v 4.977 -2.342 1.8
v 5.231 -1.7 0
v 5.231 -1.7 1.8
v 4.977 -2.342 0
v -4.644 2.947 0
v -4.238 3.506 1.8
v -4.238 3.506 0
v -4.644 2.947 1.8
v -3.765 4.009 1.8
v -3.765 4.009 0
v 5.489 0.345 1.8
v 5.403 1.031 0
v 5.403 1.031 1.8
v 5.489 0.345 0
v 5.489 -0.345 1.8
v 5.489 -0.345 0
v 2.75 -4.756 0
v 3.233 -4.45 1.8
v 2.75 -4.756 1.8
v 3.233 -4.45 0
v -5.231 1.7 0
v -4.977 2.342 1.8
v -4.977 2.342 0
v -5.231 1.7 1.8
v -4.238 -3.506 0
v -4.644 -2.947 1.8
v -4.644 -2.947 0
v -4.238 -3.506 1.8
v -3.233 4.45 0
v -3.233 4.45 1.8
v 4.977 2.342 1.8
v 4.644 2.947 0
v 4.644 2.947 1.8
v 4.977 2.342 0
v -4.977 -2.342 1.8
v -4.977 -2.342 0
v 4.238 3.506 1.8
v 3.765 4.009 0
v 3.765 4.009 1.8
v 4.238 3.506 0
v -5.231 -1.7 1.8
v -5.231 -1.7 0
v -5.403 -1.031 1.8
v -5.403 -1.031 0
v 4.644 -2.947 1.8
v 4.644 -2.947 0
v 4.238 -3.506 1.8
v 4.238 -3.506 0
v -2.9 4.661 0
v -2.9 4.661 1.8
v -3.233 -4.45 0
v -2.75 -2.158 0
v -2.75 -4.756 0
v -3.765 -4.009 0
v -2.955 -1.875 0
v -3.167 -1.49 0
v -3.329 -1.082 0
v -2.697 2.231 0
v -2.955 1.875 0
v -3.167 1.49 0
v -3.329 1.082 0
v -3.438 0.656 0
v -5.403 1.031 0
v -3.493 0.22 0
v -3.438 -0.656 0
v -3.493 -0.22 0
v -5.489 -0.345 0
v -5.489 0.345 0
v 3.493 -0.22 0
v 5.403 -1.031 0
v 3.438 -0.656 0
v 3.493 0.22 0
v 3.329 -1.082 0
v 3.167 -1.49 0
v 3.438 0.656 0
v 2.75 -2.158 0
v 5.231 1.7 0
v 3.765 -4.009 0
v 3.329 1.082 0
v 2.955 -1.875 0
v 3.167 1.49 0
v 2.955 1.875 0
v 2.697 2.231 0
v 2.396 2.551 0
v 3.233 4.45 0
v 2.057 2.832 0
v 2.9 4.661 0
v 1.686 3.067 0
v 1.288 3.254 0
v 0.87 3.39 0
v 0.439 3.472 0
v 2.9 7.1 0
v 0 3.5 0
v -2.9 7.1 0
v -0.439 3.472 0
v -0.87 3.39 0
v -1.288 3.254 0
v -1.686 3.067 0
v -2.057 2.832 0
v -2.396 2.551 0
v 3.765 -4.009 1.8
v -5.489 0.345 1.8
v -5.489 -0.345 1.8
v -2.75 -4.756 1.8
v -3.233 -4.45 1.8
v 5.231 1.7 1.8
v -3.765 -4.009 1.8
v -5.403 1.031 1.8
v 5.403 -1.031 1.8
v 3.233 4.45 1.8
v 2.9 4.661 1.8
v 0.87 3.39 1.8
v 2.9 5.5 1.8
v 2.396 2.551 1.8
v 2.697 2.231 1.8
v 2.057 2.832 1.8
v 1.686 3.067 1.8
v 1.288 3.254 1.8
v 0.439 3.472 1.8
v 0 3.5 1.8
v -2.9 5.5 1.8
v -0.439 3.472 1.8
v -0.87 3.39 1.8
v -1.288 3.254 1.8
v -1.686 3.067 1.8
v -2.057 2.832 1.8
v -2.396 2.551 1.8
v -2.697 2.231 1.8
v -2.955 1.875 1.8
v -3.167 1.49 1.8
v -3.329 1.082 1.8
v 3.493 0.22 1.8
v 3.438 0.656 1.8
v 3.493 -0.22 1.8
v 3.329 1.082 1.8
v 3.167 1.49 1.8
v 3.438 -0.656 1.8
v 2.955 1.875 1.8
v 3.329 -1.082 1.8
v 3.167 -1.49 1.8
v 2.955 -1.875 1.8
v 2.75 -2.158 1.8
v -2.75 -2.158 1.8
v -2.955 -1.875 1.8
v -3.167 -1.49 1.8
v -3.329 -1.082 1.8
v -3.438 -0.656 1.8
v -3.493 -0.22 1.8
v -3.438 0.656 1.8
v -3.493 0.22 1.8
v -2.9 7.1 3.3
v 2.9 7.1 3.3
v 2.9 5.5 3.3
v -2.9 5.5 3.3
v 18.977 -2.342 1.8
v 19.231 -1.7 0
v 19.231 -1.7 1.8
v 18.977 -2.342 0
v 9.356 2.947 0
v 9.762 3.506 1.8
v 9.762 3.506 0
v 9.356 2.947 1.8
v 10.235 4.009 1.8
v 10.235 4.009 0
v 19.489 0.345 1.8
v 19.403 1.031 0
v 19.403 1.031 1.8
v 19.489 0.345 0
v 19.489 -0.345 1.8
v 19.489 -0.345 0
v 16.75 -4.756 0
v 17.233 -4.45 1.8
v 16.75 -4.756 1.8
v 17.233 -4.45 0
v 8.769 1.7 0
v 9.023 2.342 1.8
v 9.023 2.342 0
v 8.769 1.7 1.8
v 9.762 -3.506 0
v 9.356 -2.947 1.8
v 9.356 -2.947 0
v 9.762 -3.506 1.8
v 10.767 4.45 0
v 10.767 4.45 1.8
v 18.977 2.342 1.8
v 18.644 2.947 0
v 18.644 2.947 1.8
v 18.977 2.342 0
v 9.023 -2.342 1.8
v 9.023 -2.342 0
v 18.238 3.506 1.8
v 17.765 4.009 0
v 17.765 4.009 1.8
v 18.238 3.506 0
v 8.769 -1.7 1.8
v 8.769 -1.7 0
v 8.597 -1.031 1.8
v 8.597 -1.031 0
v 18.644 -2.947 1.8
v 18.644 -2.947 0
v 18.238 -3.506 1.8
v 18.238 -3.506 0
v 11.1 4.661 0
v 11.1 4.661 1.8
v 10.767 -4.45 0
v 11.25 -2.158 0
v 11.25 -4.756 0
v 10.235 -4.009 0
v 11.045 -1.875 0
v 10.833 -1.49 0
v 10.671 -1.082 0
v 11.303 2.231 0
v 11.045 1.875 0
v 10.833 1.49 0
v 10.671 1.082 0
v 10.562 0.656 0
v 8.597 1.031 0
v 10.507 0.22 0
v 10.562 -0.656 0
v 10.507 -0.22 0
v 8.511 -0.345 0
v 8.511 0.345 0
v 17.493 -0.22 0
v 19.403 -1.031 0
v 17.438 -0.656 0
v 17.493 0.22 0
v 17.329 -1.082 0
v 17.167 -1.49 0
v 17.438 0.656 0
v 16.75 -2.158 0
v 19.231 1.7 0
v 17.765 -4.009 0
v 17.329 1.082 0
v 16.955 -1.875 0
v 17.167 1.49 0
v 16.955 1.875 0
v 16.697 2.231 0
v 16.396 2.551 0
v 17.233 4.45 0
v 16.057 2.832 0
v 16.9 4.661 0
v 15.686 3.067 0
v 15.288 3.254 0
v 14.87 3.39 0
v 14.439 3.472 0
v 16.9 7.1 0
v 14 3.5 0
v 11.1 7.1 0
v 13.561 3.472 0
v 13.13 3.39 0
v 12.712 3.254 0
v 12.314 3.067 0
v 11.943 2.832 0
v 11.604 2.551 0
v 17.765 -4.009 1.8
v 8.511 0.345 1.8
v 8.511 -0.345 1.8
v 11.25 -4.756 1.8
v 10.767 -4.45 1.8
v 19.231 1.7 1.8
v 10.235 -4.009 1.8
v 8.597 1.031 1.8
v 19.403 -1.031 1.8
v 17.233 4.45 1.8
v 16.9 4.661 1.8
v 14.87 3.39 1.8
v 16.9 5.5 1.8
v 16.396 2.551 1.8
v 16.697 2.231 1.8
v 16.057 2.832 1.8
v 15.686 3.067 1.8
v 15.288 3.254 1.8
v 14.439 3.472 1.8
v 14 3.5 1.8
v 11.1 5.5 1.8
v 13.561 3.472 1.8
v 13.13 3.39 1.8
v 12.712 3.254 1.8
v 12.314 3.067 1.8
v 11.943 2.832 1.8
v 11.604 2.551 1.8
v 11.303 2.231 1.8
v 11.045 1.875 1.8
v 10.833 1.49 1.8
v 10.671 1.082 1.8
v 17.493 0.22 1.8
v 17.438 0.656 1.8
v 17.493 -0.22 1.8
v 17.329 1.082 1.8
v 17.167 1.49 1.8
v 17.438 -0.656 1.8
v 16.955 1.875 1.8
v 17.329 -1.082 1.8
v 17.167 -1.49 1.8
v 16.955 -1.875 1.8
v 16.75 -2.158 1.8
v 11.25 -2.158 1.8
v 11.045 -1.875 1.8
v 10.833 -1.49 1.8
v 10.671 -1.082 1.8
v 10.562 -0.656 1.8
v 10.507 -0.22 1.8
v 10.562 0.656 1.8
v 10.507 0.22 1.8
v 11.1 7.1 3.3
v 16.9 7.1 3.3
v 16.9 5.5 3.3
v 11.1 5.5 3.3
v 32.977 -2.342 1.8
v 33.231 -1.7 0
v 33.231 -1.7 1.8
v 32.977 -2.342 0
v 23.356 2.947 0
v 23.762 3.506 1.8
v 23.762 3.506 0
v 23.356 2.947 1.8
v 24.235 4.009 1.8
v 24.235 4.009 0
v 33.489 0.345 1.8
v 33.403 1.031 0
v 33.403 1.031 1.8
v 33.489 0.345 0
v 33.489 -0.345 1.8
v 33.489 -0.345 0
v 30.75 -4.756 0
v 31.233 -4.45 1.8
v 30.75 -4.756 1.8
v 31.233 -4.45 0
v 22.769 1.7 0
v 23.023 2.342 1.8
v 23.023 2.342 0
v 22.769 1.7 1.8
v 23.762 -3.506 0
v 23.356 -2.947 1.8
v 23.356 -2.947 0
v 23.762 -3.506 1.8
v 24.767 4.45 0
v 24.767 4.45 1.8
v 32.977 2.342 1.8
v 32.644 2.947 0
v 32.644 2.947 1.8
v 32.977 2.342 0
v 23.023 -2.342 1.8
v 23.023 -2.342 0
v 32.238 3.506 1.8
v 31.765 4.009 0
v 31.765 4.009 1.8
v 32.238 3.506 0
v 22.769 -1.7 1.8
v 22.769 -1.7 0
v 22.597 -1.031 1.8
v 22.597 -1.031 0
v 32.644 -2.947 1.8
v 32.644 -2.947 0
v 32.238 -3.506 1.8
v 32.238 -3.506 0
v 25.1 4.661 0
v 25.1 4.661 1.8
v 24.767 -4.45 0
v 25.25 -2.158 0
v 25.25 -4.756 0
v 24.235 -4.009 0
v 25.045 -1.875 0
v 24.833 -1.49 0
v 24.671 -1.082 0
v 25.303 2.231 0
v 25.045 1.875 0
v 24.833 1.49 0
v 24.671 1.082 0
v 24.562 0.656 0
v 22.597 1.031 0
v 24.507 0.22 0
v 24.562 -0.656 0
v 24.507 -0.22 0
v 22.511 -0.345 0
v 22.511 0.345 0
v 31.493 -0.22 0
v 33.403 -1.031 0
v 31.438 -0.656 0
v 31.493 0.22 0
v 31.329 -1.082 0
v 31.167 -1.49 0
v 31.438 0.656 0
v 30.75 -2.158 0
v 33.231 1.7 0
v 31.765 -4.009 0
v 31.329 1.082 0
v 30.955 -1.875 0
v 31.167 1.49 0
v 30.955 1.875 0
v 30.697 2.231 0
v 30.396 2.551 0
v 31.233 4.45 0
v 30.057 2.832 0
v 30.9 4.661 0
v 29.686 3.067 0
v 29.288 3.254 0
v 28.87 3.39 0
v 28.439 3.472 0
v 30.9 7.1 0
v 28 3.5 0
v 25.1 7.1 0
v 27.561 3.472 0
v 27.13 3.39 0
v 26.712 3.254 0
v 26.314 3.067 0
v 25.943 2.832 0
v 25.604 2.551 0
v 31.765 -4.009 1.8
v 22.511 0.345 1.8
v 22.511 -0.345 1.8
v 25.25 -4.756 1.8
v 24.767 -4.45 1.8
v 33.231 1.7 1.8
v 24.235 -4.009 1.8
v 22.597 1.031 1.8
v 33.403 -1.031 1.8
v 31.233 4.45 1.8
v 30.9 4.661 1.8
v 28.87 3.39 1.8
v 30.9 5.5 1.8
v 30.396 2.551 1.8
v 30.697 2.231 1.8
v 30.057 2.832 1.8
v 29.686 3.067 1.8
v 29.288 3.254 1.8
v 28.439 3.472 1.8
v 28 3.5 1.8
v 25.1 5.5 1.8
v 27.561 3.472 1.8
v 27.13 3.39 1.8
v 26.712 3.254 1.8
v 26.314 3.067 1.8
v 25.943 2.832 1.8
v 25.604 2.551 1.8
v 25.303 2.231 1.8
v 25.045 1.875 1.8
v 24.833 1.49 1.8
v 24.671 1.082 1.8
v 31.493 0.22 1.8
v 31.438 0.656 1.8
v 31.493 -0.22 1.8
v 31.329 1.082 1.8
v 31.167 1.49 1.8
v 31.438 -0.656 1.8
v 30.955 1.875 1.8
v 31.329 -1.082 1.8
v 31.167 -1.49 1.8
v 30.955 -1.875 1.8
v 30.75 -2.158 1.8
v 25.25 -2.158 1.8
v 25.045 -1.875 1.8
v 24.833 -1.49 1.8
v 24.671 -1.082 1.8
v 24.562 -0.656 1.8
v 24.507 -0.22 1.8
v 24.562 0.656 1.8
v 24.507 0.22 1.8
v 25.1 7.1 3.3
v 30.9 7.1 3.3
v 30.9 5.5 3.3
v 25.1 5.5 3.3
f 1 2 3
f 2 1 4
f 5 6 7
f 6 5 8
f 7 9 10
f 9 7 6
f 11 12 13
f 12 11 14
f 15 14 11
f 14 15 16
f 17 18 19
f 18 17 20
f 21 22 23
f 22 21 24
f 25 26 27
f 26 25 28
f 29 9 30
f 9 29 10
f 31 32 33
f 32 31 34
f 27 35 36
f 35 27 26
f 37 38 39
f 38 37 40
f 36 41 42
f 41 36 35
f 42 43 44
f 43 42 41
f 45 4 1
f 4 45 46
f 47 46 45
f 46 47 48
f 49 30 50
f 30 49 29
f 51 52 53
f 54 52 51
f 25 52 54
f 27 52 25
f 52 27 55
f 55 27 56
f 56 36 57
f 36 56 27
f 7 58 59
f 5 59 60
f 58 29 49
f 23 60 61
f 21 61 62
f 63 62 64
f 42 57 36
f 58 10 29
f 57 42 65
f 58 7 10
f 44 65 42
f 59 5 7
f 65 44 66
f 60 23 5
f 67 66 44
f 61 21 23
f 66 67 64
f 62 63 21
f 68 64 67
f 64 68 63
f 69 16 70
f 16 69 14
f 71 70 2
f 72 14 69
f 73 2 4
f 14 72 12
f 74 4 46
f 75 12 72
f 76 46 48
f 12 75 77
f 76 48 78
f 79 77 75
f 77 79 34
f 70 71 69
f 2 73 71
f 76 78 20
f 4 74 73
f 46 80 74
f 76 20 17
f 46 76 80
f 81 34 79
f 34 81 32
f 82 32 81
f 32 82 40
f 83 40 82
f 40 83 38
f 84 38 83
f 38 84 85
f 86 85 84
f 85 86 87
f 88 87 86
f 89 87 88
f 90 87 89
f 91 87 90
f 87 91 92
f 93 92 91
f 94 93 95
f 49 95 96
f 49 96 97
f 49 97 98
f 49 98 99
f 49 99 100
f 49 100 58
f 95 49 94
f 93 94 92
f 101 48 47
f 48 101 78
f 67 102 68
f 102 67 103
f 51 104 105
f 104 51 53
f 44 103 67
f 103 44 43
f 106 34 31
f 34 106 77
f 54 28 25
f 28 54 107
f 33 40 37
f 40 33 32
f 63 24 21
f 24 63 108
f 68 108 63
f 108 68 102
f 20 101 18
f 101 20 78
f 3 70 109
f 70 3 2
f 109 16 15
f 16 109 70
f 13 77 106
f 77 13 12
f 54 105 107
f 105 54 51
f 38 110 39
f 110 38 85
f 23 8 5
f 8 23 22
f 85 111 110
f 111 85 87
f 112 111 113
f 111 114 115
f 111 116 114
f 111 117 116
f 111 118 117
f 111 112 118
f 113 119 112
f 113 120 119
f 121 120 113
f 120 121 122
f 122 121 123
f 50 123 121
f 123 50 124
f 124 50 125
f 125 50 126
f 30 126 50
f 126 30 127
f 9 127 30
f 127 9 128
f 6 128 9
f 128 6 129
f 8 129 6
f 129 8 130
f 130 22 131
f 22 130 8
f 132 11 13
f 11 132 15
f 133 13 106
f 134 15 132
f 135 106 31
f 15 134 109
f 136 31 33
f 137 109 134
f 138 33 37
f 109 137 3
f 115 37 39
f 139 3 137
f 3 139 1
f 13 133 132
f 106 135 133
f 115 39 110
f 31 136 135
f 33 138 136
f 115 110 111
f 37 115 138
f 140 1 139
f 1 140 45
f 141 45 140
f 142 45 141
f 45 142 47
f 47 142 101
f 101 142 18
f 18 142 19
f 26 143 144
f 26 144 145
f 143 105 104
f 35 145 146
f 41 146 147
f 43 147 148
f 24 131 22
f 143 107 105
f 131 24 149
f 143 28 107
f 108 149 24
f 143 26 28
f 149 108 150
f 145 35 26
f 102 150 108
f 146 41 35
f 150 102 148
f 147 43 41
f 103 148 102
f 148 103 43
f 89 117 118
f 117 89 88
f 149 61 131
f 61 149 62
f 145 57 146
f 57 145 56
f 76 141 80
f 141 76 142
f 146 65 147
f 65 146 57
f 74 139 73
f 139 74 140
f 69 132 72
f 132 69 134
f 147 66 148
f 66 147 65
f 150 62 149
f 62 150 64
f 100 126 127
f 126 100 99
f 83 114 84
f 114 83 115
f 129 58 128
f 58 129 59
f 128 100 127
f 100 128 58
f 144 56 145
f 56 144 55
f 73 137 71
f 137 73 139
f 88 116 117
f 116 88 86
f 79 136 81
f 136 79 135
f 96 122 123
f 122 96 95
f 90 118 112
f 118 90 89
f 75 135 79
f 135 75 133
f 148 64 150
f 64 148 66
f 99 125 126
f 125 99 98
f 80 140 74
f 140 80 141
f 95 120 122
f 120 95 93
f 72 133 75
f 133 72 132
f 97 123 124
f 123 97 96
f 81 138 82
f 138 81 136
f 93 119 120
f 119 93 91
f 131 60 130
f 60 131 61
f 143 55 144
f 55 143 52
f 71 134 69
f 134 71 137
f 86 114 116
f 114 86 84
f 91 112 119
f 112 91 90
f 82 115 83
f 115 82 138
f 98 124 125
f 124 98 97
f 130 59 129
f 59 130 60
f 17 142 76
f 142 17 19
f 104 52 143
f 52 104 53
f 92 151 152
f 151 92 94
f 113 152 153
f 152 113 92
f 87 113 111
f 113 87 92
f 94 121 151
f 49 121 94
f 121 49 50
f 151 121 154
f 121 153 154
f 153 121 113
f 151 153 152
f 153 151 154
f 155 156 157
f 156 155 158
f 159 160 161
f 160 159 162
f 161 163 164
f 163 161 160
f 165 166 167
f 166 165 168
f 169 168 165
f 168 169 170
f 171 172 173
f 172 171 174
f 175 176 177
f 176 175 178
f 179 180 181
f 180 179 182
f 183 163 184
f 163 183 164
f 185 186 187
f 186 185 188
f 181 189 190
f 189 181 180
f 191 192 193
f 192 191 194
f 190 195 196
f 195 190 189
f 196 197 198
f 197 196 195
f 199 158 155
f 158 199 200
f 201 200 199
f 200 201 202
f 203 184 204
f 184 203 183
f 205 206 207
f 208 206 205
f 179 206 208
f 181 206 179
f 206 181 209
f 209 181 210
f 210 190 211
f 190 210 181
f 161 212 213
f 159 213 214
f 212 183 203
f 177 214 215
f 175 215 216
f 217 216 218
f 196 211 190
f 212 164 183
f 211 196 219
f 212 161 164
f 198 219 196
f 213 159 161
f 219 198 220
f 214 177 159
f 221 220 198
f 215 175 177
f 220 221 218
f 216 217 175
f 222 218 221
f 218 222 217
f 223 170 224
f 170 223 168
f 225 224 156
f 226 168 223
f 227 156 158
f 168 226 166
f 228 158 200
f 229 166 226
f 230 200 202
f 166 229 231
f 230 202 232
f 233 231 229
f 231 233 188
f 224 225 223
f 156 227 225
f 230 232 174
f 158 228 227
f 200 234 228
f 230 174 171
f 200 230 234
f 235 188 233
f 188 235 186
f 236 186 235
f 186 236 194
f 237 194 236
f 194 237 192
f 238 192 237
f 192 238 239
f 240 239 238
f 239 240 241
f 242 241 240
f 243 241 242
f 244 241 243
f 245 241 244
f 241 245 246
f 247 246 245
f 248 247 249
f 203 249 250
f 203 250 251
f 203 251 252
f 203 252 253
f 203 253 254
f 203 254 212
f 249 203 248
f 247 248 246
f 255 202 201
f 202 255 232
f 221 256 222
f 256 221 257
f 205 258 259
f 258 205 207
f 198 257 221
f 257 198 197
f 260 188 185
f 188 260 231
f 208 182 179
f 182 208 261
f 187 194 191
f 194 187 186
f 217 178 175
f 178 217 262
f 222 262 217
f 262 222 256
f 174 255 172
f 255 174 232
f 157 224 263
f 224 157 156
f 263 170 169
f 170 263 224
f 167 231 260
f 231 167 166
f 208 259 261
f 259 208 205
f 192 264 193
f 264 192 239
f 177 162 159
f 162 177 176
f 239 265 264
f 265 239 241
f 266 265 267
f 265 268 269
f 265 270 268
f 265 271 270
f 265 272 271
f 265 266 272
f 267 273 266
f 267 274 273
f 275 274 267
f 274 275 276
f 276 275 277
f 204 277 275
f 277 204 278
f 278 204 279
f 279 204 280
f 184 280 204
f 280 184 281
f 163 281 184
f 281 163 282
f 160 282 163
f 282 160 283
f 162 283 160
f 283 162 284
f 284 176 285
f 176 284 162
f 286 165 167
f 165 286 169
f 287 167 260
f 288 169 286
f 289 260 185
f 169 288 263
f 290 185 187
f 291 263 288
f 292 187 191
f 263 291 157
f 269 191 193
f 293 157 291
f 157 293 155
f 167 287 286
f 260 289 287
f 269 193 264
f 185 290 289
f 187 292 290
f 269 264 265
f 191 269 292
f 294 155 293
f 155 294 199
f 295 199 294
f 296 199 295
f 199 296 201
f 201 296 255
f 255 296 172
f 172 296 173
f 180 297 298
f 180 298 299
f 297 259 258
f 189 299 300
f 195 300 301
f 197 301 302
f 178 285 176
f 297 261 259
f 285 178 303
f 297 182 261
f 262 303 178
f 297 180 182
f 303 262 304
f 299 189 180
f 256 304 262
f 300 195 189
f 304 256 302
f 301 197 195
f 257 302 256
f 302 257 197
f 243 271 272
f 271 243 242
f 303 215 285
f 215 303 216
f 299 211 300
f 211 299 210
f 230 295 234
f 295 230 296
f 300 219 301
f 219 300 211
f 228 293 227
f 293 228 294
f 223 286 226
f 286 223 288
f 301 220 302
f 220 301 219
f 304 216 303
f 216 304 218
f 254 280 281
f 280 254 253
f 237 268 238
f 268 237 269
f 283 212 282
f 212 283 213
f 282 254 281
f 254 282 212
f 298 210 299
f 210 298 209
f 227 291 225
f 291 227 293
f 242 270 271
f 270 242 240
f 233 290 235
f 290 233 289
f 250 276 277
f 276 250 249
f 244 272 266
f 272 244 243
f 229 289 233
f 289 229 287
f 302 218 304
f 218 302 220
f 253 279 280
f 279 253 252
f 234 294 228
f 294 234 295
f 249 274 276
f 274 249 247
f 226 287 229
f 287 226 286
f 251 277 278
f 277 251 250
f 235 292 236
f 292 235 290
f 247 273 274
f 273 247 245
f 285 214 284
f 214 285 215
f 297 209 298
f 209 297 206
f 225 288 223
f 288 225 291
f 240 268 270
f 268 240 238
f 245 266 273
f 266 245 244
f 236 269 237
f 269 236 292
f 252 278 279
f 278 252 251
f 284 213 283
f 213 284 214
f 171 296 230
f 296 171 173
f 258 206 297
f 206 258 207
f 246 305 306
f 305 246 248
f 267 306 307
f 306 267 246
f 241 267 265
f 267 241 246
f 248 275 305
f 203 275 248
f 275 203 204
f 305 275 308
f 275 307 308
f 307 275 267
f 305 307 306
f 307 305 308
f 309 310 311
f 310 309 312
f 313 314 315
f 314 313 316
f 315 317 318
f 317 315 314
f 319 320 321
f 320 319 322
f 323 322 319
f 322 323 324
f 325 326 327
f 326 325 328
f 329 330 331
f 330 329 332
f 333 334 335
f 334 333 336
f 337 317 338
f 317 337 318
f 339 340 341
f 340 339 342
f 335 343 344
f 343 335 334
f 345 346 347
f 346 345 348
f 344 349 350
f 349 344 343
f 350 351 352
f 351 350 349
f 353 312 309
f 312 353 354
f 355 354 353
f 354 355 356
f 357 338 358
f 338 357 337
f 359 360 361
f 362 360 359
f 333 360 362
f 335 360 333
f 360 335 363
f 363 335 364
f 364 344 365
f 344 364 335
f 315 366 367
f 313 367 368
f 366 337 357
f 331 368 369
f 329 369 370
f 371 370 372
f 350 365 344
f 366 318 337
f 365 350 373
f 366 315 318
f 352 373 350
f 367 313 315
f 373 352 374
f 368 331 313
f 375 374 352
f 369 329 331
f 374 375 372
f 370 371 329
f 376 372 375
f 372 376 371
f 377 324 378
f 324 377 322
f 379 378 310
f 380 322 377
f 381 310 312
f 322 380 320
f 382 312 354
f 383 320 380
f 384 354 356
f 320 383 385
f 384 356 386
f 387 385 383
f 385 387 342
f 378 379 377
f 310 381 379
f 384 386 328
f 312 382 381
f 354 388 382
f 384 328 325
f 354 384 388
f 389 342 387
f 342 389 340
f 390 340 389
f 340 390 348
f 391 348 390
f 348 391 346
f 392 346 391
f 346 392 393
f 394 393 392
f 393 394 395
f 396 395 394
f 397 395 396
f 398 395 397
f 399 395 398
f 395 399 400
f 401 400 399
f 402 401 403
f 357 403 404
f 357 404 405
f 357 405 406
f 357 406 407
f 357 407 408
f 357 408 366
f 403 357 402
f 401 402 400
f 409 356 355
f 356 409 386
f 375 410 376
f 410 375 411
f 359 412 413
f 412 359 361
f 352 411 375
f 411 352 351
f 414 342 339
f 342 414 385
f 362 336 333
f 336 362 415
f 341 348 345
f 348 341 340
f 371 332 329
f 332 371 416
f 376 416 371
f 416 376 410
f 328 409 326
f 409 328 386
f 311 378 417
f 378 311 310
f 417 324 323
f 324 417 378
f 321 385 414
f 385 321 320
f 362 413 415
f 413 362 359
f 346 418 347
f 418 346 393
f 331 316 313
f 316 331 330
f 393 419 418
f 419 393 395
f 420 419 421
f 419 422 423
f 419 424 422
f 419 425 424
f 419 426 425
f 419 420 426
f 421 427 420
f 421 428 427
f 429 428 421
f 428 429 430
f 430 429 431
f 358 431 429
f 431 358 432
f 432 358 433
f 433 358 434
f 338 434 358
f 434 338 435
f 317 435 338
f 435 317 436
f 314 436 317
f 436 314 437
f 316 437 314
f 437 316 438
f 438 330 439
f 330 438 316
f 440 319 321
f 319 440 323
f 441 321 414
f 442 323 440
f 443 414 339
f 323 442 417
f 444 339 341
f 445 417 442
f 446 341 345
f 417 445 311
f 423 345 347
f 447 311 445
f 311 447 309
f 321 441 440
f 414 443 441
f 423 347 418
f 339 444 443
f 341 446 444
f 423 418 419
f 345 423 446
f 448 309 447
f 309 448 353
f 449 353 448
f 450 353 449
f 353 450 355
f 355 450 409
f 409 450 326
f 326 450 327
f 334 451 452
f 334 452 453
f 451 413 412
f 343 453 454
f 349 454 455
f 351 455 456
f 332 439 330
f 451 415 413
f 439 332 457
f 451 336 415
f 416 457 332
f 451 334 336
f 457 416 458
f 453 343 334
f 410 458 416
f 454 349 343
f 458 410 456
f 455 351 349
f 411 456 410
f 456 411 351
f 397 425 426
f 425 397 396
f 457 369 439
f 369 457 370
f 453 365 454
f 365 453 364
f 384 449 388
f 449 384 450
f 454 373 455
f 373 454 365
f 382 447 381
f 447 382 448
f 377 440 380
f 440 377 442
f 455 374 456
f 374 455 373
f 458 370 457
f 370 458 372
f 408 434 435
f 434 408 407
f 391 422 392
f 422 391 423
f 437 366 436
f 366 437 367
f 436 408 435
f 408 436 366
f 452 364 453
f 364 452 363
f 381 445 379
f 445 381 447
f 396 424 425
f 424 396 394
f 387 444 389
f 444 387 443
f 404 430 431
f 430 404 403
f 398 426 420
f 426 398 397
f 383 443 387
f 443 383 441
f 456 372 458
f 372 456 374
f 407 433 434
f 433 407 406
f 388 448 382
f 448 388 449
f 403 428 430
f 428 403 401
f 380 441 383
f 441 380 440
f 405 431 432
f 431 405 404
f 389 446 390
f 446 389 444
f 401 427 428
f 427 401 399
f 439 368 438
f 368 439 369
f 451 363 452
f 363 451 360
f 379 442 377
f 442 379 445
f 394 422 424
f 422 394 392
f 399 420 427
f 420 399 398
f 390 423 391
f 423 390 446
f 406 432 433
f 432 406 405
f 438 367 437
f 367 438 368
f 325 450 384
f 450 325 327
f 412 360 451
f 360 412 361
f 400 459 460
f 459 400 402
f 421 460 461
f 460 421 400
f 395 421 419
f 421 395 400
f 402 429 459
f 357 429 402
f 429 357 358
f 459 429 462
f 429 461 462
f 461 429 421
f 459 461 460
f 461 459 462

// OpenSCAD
// 3D printer Bowden clip customizer.

// How many clips to print.
count = 3;
// Clip's thickness
ring_thickness = 1.8;
// Inner diameter of the clip
ring_id = 7;
// Outer diameter of the clip
ring_od = 11;
// Width of the clip's opening
ring_cut_width = 5.5;
// Width of the vertical tab.
tab_width = 5.8;
// Height of the vertical tab.
tab_height = 1.5;
// Thickness of the vertical tab.
tab_thickness = 1.6;
// Controls the distance between the vertical tab and the ring.. 
tab_offset = 0;


/* [Hidden] */

$fn = 50;
eps = 0.01;

module bowden_clip_tab() {
  ring_width = (ring_od - ring_id)/2;
  base_length = ring_width + tab_offset + tab_thickness;
  translate([-base_length-ring_id/2, -tab_width/2, 0]) 
    cube([base_length, tab_width, ring_thickness]);
  translate([-ring_od/2-tab_offset-tab_thickness, -tab_width/2, 0])
    cube([tab_thickness, tab_width, ring_thickness+tab_height]);
  
}

module bowden_clip_ring() {
  difference() {
    cylinder(d=ring_od, h=ring_thickness);
    translate([0, 0, -eps]) 
      cylinder(d=ring_id, h=ring_thickness+2*eps);
    translate([0, -ring_cut_width/2, -eps]) 
      cube([ring_od/2+eps, ring_cut_width, ring_thickness+2*eps]);
  }
}

module bowden_clip() {
  bowden_clip_ring();
  bowden_clip_tab();
}

for (i = [0 : count-1]) {
  translate([i*(ring_od + 3), 0, 0]) rotate([0, 0, -90]) bowden_clip(); 
}
